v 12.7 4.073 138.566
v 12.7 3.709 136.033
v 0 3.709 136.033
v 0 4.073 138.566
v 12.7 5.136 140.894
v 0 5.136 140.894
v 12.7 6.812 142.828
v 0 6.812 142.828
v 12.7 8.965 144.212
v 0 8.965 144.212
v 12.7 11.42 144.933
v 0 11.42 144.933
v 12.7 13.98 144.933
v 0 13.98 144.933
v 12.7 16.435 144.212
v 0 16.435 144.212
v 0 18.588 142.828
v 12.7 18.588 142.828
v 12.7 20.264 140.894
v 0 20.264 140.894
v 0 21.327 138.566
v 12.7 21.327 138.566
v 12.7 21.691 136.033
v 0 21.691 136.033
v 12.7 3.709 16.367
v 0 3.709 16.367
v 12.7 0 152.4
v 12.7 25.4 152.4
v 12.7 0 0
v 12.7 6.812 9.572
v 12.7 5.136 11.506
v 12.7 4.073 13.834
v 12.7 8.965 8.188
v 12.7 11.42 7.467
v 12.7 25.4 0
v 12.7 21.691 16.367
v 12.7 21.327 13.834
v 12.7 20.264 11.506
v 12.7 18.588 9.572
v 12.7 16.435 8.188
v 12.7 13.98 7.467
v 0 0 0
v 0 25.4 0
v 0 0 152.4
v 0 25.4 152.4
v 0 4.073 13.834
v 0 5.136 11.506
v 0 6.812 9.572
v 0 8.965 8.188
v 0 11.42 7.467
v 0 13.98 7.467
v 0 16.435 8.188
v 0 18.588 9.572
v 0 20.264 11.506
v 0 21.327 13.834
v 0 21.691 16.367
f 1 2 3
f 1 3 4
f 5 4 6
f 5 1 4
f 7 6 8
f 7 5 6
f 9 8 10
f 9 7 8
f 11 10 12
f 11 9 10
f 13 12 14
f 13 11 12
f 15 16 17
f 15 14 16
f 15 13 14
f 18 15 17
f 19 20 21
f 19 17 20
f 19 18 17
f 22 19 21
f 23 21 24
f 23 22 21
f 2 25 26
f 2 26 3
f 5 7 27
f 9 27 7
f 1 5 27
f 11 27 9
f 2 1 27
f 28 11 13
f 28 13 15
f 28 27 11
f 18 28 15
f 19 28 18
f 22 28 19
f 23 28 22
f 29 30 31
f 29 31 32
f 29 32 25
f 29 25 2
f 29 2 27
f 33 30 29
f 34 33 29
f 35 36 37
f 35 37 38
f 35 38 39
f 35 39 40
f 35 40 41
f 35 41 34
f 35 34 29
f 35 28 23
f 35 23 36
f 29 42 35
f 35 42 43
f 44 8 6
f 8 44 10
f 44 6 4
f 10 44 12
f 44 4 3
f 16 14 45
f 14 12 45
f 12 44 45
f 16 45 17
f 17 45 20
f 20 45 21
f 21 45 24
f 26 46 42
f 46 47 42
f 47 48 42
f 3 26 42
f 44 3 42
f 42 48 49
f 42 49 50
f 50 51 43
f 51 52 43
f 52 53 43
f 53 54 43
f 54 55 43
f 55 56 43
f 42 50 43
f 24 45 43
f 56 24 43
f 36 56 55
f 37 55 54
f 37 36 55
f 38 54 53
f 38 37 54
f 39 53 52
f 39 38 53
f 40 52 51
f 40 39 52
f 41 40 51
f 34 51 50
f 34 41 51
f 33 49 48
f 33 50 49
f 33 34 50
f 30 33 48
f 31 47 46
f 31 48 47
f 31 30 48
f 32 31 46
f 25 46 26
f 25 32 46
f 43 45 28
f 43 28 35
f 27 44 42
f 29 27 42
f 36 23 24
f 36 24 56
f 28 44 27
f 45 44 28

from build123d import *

# Parameters (mm, degrees)
SKETCH1_W           = 152.4
SKETCH1_H           = 25.4
BOSS_EXTRUDE1_DEPTH = 12.7
CUT_EXTRUDE2_REACH  = 156.654


with BuildPart() as part:
    # Sketch1 → Boss-Extrude1 (new body)
    with BuildSketch(Plane(origin=(0, 0, 0), x_dir=(0, 0, -1), z_dir=(1, 0, 0))):
        with Locations((-76.2, 12.7)):
            Rectangle(SKETCH1_W, SKETCH1_H)
    extrude(amount=BOSS_EXTRUDE1_DEPTH)

    # Sketch3 → Cut-Extrude2 (cut, up to next)
    with BuildSketch(Plane(origin=(12.7, 2.360975137, 0), x_dir=(0, 0, -1), z_dir=(1, 0, 0)), mode=Mode.PRIVATE) as cut_extrude2_sk1:
        with BuildLine():
            Line((-136.033448355, 19.329867732), (-16.366551645, 19.329867732))
            ThreePointArc((-16.366551645, 19.329867732), (-7.375708776, 10.339024863), (-16.366551645, 1.348181995))
            Line((-16.366551645, 1.348181995), (-136.033448355, 1.348181995))
            ThreePointArc((-136.033448355, 1.348181995), (-145.024291224, 10.339024863), (-136.033448355, 19.329867732))
        make_face()
    cut_extrude2_tool1 = extrude(cut_extrude2_sk1.sketch, amount=-CUT_EXTRUDE2_REACH, mode=Mode.PRIVATE) & part.part
    add(cut_extrude2_tool1.solids().sort_by_distance((12.7, 12.7, 76.2))[0], mode=Mode.SUBTRACT)


solid = part.part
